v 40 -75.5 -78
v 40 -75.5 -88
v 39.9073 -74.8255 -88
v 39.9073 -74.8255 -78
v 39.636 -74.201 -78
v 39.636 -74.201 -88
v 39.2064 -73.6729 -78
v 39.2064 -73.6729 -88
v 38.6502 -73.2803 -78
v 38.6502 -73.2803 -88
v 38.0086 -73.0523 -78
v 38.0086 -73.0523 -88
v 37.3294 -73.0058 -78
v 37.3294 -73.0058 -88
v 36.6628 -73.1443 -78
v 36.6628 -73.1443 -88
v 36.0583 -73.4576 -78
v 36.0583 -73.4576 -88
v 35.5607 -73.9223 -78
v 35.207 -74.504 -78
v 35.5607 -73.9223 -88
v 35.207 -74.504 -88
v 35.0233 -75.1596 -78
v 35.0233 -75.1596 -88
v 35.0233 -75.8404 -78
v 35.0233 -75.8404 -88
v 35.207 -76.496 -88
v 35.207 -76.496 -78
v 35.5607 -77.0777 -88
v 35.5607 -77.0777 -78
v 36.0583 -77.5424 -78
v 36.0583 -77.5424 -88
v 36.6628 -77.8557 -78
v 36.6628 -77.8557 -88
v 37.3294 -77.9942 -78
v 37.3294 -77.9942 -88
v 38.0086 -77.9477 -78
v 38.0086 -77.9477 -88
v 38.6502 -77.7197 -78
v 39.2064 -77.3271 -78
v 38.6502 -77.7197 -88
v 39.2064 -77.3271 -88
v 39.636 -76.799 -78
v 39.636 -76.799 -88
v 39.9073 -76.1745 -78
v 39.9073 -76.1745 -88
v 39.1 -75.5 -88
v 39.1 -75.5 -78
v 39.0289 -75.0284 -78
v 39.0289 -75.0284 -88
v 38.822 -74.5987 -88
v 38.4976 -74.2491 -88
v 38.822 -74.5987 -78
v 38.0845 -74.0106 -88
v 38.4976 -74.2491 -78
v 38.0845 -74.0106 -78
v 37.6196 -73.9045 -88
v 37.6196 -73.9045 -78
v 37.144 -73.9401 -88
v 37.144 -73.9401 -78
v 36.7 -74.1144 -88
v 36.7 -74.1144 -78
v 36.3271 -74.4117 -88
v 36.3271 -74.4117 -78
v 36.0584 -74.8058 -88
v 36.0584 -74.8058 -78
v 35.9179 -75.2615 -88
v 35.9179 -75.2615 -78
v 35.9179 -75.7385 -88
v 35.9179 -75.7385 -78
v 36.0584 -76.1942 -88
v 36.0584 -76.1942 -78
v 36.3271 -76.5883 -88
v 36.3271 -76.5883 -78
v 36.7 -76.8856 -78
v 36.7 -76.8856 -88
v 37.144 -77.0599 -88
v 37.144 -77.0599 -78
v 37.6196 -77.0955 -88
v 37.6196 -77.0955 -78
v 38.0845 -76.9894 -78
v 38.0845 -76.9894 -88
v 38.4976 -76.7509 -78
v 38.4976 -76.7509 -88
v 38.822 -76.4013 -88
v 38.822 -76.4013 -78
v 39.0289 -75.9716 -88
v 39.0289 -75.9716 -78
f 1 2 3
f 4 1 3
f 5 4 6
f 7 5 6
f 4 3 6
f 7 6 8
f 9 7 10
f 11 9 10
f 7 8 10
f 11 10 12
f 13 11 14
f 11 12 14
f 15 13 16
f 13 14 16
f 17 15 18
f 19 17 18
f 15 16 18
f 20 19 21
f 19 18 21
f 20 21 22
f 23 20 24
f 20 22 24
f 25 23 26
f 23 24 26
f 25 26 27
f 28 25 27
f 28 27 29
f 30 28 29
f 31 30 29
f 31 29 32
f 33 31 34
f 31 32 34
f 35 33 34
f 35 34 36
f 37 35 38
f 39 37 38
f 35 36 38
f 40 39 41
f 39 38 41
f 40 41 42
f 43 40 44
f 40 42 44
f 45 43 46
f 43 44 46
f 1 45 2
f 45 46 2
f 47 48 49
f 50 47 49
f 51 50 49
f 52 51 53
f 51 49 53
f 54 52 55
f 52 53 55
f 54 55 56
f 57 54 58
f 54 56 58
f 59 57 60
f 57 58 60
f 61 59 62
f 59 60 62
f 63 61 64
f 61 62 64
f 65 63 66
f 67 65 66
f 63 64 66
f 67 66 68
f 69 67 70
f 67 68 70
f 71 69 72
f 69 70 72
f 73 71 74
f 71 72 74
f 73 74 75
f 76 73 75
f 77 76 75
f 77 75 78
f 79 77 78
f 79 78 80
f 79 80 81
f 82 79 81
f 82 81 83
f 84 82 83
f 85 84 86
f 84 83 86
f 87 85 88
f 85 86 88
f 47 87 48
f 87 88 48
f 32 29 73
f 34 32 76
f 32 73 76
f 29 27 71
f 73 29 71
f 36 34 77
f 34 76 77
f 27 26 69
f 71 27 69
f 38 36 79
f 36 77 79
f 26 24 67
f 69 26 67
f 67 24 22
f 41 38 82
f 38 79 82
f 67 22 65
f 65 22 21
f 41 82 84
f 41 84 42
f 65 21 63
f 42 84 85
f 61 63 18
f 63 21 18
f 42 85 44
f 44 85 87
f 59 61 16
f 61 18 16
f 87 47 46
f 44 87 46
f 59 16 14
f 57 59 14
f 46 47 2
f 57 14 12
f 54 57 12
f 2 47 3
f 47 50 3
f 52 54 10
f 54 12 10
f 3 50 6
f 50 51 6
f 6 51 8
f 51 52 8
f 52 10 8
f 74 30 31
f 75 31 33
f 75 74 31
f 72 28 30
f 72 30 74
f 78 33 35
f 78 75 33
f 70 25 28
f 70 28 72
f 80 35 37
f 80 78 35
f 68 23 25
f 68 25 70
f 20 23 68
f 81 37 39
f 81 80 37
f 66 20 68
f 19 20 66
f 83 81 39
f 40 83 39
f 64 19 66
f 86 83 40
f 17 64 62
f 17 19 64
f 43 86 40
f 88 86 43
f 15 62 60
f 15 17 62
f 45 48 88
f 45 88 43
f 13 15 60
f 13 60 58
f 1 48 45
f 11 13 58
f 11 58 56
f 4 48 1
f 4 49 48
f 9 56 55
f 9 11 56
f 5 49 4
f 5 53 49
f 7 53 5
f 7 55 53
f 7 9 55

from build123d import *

# Parameters (mm, degrees)
SKETCH059_R  = 1.6
PAD025_DEPTH = 10
SKETCH058_R  = 2.5
PAD024_DEPTH = 10


with BuildPart() as pad025:
    # Sketch059 → Pad025 (new body)
    with BuildSketch(Plane.XY.offset(10)):
        Circle(SKETCH059_R)
    extrude(amount=-PAD025_DEPTH)


with BuildPart() as cut040:
    # Sketch058 → Pad024 (new body)
    with BuildSketch(Plane.XY):
        Circle(SKETCH058_R)
    extrude(amount=PAD024_DEPTH)

    # Cut040: cut Pad025
    add(pad025.part, mode=Mode.SUBTRACT)


with BuildPart() as cut040_1:
    # Cut040 placement: moved
    add(cut040.part.moved(Location((37.5, -75.5, -88))))


solid = cut040_1.part
